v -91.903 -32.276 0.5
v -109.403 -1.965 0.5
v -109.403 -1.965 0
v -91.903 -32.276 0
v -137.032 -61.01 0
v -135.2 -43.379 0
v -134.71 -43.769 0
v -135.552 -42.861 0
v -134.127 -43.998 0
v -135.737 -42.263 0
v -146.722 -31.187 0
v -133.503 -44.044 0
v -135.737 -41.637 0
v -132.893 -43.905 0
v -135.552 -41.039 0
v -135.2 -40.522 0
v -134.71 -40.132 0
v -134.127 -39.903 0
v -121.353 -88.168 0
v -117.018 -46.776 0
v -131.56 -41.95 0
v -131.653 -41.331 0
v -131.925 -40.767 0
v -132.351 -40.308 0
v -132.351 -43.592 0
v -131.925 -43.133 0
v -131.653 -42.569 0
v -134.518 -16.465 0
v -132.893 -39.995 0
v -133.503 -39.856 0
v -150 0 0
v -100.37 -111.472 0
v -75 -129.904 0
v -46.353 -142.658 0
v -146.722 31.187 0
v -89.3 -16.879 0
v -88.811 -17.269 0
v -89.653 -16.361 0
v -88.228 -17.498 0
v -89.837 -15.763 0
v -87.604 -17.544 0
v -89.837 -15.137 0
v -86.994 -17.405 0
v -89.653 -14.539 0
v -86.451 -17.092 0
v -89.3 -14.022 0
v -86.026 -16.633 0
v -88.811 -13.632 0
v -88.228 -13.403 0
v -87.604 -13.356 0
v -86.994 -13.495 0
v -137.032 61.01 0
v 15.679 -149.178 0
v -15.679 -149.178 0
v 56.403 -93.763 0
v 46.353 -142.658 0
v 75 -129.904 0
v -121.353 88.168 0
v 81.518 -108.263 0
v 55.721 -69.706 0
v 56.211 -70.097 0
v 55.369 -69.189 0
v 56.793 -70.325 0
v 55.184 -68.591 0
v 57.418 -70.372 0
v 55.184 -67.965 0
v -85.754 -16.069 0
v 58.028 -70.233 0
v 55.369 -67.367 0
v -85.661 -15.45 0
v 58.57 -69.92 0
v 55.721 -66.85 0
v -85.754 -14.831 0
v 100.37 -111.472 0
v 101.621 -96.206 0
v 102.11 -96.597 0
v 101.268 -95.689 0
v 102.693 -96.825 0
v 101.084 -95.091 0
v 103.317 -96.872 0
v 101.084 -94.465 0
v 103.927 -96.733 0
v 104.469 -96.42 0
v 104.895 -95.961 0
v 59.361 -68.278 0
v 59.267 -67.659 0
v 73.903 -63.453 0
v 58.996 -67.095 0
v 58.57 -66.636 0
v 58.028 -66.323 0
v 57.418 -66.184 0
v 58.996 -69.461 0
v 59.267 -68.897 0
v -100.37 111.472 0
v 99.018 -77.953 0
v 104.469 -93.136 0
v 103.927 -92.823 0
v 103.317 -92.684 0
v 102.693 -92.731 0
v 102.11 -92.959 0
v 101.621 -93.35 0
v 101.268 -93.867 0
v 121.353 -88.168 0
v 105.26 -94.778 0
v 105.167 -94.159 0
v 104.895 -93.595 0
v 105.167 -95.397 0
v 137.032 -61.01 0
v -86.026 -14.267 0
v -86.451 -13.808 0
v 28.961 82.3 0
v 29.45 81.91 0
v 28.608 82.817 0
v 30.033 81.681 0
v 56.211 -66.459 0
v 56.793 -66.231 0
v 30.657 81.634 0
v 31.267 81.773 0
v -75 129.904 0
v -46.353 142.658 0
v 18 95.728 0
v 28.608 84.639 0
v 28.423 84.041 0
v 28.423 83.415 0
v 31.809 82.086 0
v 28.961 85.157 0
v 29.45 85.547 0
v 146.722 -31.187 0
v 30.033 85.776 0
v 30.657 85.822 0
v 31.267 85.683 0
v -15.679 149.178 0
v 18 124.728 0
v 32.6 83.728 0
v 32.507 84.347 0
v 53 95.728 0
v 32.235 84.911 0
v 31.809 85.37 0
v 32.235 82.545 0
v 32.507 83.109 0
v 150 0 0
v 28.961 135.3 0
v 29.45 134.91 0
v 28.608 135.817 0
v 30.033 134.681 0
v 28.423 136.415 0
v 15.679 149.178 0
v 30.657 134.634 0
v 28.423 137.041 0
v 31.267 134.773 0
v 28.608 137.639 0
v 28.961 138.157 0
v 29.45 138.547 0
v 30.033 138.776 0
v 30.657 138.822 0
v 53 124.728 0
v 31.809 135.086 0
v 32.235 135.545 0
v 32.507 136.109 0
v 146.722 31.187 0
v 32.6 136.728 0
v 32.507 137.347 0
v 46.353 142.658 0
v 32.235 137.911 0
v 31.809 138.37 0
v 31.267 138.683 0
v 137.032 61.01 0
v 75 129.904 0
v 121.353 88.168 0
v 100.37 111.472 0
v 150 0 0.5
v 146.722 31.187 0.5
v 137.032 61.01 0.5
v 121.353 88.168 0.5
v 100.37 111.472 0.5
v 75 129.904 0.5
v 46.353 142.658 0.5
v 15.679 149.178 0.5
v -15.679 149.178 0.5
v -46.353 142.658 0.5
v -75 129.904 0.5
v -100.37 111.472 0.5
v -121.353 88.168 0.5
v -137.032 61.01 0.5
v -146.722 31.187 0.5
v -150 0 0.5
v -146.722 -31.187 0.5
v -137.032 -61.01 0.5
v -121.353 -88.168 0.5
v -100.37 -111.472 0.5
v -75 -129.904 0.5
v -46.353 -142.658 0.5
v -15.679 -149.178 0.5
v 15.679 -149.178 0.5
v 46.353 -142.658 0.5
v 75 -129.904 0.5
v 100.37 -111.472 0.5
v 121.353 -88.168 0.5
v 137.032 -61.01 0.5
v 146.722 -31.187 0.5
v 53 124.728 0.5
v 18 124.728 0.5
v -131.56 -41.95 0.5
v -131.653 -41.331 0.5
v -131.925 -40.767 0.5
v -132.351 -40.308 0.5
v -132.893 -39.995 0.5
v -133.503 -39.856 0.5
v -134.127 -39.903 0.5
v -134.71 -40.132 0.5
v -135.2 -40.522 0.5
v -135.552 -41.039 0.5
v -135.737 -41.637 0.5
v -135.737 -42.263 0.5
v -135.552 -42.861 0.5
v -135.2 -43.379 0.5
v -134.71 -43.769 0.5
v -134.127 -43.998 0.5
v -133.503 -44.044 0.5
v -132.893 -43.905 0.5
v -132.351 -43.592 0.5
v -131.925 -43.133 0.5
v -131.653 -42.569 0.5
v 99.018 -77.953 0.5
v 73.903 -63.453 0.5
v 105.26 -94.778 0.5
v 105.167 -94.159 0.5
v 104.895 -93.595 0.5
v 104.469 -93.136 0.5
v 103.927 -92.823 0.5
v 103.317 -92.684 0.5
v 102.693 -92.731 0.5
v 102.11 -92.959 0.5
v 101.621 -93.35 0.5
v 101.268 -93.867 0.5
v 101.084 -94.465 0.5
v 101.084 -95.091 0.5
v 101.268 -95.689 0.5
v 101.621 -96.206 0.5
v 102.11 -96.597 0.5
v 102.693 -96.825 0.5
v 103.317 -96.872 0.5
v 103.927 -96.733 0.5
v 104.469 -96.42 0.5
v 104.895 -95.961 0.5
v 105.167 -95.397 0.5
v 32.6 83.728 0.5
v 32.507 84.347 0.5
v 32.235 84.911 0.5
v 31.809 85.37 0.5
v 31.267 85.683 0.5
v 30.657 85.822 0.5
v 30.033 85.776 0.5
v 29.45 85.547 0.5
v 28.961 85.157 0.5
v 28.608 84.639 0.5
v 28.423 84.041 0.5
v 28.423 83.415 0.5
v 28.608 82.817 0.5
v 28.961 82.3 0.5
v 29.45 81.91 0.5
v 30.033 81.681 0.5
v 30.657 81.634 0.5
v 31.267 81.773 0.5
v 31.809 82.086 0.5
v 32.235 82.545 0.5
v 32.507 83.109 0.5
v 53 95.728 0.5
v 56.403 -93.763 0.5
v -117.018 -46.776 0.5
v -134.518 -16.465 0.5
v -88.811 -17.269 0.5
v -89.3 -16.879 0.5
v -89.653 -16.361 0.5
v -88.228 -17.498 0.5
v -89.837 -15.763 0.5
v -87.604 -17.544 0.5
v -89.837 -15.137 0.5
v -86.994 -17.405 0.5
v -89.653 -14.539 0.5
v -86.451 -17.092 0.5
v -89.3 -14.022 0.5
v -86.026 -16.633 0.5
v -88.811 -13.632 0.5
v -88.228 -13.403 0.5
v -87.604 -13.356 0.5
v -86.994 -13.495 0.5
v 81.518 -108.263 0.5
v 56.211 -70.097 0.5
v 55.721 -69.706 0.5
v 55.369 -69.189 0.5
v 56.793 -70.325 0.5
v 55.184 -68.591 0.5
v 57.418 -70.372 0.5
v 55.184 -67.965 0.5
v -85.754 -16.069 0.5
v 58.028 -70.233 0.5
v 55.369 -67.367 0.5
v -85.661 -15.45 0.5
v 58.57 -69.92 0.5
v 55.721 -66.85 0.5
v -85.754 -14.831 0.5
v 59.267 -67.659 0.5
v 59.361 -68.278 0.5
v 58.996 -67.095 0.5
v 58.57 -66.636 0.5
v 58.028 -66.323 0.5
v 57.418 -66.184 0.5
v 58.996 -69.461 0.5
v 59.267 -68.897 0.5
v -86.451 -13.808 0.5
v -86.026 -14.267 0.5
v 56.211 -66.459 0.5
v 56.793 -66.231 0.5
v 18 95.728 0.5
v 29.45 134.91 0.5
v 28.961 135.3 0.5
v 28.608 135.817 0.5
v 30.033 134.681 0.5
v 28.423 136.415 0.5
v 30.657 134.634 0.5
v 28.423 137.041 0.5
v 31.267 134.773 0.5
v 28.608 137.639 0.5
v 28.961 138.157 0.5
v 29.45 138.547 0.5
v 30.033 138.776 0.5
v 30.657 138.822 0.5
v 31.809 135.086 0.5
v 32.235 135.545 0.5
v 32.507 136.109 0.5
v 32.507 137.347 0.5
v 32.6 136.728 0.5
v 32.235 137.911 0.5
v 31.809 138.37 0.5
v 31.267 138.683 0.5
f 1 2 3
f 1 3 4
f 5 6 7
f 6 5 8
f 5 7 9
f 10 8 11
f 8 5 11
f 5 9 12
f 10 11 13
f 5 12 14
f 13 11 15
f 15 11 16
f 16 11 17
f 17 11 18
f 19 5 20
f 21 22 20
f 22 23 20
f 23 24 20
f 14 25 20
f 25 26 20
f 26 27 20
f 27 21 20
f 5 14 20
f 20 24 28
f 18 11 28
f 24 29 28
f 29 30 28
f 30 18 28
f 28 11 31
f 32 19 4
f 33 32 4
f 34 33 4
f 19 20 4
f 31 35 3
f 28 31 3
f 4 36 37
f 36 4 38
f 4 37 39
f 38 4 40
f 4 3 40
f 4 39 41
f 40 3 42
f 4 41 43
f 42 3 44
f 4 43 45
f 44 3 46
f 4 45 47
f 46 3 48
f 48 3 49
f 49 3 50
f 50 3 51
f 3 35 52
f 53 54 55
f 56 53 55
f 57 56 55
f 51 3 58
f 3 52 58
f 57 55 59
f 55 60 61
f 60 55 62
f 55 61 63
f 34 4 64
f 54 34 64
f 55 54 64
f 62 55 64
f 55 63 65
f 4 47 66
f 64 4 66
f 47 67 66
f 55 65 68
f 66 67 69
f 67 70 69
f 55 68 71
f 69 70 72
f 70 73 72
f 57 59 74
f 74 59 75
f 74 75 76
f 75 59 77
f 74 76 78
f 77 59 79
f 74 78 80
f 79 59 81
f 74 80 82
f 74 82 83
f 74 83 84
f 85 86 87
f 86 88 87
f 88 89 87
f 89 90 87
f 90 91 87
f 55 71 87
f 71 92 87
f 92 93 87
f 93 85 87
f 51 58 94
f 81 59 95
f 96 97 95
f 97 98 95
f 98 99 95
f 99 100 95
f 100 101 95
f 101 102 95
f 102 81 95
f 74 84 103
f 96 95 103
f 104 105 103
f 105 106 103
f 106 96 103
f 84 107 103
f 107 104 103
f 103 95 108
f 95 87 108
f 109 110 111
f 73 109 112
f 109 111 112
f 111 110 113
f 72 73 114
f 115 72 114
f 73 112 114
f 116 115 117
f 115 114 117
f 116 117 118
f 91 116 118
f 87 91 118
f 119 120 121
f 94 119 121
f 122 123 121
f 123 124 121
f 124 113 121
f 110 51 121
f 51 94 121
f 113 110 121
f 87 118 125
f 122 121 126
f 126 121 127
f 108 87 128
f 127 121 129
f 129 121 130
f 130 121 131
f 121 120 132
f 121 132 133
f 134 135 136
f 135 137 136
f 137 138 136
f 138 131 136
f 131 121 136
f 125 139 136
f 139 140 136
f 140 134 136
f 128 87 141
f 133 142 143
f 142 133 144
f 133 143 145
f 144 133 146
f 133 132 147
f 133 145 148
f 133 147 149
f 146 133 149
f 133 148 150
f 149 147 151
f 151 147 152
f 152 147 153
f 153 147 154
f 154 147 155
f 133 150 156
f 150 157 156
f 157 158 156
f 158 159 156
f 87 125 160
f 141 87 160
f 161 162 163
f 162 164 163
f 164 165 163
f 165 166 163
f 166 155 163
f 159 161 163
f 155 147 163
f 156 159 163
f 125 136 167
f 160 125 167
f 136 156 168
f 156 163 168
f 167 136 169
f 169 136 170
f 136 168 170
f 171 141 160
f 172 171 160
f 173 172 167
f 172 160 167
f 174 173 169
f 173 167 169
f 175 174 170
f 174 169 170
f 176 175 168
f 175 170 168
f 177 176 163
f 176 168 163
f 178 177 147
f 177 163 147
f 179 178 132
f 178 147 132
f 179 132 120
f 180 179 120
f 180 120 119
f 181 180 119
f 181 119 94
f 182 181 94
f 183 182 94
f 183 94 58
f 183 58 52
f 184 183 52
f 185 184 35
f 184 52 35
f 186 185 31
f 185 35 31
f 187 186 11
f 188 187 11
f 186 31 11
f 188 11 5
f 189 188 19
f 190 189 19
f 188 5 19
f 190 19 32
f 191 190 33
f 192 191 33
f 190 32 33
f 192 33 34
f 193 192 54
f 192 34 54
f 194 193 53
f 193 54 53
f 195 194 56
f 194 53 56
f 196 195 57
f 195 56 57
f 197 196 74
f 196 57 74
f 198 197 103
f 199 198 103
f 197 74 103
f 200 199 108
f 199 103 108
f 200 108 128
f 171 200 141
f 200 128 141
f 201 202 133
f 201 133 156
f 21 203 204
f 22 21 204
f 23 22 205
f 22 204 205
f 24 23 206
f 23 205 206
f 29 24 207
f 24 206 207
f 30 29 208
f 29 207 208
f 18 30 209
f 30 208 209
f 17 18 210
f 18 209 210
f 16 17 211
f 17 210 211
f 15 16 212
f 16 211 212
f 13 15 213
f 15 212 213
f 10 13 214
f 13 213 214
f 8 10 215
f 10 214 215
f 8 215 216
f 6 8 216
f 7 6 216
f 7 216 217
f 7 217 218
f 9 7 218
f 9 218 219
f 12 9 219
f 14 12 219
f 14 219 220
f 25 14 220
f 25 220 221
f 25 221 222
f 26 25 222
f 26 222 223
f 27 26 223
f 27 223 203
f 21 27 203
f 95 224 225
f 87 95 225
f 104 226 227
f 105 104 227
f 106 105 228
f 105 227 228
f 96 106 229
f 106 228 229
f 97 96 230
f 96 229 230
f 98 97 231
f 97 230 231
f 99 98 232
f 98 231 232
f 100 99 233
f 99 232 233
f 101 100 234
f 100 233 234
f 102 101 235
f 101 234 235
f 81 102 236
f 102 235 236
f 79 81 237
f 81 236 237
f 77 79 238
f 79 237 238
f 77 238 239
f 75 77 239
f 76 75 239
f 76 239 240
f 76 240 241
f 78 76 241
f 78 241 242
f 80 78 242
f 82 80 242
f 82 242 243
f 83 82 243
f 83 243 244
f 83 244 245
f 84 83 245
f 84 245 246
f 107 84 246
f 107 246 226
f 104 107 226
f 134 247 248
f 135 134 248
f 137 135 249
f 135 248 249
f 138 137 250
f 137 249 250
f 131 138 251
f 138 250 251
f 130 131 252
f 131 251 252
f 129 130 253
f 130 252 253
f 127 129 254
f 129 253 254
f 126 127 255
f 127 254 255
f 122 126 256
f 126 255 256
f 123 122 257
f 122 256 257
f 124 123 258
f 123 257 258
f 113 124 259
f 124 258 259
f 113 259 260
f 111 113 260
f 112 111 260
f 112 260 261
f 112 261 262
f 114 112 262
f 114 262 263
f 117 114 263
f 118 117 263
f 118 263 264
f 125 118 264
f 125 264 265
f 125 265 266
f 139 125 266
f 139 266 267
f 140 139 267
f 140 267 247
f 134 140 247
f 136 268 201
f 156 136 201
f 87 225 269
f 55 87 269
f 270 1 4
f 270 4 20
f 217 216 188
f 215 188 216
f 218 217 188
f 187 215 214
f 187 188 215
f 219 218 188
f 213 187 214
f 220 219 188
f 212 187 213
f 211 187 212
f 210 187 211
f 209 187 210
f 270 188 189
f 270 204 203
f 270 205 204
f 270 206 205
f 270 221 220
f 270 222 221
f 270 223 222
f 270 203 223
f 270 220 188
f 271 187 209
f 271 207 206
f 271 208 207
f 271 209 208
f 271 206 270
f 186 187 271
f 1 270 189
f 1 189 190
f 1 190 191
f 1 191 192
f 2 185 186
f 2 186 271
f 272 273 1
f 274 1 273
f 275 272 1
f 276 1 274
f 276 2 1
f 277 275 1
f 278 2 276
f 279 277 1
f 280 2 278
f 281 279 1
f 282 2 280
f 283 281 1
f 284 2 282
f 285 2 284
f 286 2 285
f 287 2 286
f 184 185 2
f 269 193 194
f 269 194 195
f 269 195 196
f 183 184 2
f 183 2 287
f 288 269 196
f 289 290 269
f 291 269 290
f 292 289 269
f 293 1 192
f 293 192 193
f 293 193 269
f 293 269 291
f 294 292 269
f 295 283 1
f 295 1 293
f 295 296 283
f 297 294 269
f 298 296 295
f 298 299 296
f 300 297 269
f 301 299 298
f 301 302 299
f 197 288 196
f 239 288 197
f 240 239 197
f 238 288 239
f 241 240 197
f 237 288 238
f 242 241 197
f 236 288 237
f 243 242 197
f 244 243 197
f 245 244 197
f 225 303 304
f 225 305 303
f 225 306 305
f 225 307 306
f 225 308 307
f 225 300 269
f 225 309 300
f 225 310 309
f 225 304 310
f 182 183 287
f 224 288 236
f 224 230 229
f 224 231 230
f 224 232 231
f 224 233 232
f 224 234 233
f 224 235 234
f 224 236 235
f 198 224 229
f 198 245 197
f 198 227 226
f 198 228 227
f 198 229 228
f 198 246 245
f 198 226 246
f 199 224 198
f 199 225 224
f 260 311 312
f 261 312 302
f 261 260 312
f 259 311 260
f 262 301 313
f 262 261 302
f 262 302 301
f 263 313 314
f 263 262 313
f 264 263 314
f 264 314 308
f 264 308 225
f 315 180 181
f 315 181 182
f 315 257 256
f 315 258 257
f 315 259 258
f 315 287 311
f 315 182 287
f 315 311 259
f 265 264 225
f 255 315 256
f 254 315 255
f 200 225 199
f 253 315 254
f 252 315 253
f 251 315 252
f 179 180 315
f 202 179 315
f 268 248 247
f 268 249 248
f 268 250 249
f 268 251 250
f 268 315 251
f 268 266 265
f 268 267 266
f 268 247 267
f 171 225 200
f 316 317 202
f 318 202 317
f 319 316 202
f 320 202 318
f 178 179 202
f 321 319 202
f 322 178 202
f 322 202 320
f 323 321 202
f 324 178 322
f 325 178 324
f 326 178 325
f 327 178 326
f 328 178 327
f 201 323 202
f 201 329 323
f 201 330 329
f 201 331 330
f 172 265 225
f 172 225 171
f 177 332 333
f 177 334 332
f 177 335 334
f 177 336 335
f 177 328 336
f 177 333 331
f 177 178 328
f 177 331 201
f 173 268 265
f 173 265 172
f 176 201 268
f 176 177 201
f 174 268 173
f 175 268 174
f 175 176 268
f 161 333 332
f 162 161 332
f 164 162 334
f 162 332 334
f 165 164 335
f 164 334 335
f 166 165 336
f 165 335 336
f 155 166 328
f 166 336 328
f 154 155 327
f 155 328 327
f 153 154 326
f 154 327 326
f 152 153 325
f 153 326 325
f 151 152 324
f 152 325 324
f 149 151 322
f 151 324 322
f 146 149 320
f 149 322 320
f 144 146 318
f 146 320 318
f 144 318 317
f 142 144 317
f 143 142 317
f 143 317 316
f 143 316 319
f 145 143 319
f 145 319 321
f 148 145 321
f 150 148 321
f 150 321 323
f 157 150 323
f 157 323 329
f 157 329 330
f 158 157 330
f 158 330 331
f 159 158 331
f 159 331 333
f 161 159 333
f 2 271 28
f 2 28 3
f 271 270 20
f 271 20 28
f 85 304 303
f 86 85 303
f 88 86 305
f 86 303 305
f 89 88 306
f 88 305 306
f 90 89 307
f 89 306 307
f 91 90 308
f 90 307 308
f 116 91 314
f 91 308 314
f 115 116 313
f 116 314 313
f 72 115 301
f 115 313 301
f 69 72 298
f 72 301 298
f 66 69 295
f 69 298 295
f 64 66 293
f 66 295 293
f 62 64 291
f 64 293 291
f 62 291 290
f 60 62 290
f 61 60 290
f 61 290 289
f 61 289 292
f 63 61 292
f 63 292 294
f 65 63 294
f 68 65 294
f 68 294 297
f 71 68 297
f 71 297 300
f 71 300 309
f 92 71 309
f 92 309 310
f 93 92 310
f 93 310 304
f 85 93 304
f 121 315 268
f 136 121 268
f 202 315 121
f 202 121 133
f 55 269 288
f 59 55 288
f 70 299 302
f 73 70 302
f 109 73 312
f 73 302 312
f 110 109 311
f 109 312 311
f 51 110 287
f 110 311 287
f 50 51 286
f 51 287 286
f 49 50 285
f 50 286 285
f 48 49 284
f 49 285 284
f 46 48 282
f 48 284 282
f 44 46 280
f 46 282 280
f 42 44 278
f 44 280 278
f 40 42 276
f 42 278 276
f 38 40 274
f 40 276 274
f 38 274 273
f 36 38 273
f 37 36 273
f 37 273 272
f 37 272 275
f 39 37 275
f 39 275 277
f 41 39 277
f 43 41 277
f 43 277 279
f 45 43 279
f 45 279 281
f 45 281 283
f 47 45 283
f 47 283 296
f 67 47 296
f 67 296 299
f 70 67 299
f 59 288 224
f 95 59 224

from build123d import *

# Parameters (mm, degrees)
ESQUISSE1_R             = 150
BOSS_EXTRU_1_DEPTH      = 0.5
ESQUISSE6_W             = 35
ESQUISSE6_H             = 29
ENL_V_MAT_EXTRU_2_DEPTH = 3.175
ESQUISSE7_R             = 2.1
ENL_V_MAT_EXTRU_3_DEPTH = 213.132623611


with BuildPart() as part:
    # Esquisse1 → Boss.-Extru.1 (new body)
    with BuildSketch(Plane.XY):
        Circle(ESQUISSE1_R)
    extrude(amount=BOSS_EXTRU_1_DEPTH)

    # Esquisse6 → Enlèv. mat.-Extru.2 (cut)
    with BuildSketch(Plane.XY.offset(0.5)):
        with Locations((35.5, 110.228215567)):
            Rectangle(ESQUISSE6_W, ESQUISSE6_H)
        Polygon((73.90306654, -63.452565052), (56.40306654, -93.763454184), (81.51780325, -108.263454184), (99.01780325, -77.952565052), align=None)
        Polygon((-109.40306654, -1.964761383), (-91.90306654, -32.275650515), (-117.01780325, -46.775650515), (-134.51780325, -16.464761383), align=None)
    extrude(amount=-ENL_V_MAT_EXTRU_2_DEPTH, mode=Mode.SUBTRACT)

    # Esquisse7 → Enlèv. mat.-Extru.3 (cut, through all)
    with BuildSketch(Plane.XY.offset(0.5)):
        with Locations((-133.660108095, -41.950332968)):
            Circle(ESQUISSE7_R)
        with Locations((-87.760761694, -15.450332968)):
            Circle(ESQUISSE7_R)
        with Locations((30.5, 136.728215567)):
            Circle(ESQUISSE7_R)
        with Locations((30.5, 83.728215567)):
            Circle(ESQUISSE7_R)
        with Locations((103.160108095, -94.777882599)):
            Circle(ESQUISSE7_R)
        with Locations((57.260761694, -68.277882599)):
            Circle(ESQUISSE7_R)
    extrude(amount=-ENL_V_MAT_EXTRU_3_DEPTH, mode=Mode.SUBTRACT)


solid = part.part
